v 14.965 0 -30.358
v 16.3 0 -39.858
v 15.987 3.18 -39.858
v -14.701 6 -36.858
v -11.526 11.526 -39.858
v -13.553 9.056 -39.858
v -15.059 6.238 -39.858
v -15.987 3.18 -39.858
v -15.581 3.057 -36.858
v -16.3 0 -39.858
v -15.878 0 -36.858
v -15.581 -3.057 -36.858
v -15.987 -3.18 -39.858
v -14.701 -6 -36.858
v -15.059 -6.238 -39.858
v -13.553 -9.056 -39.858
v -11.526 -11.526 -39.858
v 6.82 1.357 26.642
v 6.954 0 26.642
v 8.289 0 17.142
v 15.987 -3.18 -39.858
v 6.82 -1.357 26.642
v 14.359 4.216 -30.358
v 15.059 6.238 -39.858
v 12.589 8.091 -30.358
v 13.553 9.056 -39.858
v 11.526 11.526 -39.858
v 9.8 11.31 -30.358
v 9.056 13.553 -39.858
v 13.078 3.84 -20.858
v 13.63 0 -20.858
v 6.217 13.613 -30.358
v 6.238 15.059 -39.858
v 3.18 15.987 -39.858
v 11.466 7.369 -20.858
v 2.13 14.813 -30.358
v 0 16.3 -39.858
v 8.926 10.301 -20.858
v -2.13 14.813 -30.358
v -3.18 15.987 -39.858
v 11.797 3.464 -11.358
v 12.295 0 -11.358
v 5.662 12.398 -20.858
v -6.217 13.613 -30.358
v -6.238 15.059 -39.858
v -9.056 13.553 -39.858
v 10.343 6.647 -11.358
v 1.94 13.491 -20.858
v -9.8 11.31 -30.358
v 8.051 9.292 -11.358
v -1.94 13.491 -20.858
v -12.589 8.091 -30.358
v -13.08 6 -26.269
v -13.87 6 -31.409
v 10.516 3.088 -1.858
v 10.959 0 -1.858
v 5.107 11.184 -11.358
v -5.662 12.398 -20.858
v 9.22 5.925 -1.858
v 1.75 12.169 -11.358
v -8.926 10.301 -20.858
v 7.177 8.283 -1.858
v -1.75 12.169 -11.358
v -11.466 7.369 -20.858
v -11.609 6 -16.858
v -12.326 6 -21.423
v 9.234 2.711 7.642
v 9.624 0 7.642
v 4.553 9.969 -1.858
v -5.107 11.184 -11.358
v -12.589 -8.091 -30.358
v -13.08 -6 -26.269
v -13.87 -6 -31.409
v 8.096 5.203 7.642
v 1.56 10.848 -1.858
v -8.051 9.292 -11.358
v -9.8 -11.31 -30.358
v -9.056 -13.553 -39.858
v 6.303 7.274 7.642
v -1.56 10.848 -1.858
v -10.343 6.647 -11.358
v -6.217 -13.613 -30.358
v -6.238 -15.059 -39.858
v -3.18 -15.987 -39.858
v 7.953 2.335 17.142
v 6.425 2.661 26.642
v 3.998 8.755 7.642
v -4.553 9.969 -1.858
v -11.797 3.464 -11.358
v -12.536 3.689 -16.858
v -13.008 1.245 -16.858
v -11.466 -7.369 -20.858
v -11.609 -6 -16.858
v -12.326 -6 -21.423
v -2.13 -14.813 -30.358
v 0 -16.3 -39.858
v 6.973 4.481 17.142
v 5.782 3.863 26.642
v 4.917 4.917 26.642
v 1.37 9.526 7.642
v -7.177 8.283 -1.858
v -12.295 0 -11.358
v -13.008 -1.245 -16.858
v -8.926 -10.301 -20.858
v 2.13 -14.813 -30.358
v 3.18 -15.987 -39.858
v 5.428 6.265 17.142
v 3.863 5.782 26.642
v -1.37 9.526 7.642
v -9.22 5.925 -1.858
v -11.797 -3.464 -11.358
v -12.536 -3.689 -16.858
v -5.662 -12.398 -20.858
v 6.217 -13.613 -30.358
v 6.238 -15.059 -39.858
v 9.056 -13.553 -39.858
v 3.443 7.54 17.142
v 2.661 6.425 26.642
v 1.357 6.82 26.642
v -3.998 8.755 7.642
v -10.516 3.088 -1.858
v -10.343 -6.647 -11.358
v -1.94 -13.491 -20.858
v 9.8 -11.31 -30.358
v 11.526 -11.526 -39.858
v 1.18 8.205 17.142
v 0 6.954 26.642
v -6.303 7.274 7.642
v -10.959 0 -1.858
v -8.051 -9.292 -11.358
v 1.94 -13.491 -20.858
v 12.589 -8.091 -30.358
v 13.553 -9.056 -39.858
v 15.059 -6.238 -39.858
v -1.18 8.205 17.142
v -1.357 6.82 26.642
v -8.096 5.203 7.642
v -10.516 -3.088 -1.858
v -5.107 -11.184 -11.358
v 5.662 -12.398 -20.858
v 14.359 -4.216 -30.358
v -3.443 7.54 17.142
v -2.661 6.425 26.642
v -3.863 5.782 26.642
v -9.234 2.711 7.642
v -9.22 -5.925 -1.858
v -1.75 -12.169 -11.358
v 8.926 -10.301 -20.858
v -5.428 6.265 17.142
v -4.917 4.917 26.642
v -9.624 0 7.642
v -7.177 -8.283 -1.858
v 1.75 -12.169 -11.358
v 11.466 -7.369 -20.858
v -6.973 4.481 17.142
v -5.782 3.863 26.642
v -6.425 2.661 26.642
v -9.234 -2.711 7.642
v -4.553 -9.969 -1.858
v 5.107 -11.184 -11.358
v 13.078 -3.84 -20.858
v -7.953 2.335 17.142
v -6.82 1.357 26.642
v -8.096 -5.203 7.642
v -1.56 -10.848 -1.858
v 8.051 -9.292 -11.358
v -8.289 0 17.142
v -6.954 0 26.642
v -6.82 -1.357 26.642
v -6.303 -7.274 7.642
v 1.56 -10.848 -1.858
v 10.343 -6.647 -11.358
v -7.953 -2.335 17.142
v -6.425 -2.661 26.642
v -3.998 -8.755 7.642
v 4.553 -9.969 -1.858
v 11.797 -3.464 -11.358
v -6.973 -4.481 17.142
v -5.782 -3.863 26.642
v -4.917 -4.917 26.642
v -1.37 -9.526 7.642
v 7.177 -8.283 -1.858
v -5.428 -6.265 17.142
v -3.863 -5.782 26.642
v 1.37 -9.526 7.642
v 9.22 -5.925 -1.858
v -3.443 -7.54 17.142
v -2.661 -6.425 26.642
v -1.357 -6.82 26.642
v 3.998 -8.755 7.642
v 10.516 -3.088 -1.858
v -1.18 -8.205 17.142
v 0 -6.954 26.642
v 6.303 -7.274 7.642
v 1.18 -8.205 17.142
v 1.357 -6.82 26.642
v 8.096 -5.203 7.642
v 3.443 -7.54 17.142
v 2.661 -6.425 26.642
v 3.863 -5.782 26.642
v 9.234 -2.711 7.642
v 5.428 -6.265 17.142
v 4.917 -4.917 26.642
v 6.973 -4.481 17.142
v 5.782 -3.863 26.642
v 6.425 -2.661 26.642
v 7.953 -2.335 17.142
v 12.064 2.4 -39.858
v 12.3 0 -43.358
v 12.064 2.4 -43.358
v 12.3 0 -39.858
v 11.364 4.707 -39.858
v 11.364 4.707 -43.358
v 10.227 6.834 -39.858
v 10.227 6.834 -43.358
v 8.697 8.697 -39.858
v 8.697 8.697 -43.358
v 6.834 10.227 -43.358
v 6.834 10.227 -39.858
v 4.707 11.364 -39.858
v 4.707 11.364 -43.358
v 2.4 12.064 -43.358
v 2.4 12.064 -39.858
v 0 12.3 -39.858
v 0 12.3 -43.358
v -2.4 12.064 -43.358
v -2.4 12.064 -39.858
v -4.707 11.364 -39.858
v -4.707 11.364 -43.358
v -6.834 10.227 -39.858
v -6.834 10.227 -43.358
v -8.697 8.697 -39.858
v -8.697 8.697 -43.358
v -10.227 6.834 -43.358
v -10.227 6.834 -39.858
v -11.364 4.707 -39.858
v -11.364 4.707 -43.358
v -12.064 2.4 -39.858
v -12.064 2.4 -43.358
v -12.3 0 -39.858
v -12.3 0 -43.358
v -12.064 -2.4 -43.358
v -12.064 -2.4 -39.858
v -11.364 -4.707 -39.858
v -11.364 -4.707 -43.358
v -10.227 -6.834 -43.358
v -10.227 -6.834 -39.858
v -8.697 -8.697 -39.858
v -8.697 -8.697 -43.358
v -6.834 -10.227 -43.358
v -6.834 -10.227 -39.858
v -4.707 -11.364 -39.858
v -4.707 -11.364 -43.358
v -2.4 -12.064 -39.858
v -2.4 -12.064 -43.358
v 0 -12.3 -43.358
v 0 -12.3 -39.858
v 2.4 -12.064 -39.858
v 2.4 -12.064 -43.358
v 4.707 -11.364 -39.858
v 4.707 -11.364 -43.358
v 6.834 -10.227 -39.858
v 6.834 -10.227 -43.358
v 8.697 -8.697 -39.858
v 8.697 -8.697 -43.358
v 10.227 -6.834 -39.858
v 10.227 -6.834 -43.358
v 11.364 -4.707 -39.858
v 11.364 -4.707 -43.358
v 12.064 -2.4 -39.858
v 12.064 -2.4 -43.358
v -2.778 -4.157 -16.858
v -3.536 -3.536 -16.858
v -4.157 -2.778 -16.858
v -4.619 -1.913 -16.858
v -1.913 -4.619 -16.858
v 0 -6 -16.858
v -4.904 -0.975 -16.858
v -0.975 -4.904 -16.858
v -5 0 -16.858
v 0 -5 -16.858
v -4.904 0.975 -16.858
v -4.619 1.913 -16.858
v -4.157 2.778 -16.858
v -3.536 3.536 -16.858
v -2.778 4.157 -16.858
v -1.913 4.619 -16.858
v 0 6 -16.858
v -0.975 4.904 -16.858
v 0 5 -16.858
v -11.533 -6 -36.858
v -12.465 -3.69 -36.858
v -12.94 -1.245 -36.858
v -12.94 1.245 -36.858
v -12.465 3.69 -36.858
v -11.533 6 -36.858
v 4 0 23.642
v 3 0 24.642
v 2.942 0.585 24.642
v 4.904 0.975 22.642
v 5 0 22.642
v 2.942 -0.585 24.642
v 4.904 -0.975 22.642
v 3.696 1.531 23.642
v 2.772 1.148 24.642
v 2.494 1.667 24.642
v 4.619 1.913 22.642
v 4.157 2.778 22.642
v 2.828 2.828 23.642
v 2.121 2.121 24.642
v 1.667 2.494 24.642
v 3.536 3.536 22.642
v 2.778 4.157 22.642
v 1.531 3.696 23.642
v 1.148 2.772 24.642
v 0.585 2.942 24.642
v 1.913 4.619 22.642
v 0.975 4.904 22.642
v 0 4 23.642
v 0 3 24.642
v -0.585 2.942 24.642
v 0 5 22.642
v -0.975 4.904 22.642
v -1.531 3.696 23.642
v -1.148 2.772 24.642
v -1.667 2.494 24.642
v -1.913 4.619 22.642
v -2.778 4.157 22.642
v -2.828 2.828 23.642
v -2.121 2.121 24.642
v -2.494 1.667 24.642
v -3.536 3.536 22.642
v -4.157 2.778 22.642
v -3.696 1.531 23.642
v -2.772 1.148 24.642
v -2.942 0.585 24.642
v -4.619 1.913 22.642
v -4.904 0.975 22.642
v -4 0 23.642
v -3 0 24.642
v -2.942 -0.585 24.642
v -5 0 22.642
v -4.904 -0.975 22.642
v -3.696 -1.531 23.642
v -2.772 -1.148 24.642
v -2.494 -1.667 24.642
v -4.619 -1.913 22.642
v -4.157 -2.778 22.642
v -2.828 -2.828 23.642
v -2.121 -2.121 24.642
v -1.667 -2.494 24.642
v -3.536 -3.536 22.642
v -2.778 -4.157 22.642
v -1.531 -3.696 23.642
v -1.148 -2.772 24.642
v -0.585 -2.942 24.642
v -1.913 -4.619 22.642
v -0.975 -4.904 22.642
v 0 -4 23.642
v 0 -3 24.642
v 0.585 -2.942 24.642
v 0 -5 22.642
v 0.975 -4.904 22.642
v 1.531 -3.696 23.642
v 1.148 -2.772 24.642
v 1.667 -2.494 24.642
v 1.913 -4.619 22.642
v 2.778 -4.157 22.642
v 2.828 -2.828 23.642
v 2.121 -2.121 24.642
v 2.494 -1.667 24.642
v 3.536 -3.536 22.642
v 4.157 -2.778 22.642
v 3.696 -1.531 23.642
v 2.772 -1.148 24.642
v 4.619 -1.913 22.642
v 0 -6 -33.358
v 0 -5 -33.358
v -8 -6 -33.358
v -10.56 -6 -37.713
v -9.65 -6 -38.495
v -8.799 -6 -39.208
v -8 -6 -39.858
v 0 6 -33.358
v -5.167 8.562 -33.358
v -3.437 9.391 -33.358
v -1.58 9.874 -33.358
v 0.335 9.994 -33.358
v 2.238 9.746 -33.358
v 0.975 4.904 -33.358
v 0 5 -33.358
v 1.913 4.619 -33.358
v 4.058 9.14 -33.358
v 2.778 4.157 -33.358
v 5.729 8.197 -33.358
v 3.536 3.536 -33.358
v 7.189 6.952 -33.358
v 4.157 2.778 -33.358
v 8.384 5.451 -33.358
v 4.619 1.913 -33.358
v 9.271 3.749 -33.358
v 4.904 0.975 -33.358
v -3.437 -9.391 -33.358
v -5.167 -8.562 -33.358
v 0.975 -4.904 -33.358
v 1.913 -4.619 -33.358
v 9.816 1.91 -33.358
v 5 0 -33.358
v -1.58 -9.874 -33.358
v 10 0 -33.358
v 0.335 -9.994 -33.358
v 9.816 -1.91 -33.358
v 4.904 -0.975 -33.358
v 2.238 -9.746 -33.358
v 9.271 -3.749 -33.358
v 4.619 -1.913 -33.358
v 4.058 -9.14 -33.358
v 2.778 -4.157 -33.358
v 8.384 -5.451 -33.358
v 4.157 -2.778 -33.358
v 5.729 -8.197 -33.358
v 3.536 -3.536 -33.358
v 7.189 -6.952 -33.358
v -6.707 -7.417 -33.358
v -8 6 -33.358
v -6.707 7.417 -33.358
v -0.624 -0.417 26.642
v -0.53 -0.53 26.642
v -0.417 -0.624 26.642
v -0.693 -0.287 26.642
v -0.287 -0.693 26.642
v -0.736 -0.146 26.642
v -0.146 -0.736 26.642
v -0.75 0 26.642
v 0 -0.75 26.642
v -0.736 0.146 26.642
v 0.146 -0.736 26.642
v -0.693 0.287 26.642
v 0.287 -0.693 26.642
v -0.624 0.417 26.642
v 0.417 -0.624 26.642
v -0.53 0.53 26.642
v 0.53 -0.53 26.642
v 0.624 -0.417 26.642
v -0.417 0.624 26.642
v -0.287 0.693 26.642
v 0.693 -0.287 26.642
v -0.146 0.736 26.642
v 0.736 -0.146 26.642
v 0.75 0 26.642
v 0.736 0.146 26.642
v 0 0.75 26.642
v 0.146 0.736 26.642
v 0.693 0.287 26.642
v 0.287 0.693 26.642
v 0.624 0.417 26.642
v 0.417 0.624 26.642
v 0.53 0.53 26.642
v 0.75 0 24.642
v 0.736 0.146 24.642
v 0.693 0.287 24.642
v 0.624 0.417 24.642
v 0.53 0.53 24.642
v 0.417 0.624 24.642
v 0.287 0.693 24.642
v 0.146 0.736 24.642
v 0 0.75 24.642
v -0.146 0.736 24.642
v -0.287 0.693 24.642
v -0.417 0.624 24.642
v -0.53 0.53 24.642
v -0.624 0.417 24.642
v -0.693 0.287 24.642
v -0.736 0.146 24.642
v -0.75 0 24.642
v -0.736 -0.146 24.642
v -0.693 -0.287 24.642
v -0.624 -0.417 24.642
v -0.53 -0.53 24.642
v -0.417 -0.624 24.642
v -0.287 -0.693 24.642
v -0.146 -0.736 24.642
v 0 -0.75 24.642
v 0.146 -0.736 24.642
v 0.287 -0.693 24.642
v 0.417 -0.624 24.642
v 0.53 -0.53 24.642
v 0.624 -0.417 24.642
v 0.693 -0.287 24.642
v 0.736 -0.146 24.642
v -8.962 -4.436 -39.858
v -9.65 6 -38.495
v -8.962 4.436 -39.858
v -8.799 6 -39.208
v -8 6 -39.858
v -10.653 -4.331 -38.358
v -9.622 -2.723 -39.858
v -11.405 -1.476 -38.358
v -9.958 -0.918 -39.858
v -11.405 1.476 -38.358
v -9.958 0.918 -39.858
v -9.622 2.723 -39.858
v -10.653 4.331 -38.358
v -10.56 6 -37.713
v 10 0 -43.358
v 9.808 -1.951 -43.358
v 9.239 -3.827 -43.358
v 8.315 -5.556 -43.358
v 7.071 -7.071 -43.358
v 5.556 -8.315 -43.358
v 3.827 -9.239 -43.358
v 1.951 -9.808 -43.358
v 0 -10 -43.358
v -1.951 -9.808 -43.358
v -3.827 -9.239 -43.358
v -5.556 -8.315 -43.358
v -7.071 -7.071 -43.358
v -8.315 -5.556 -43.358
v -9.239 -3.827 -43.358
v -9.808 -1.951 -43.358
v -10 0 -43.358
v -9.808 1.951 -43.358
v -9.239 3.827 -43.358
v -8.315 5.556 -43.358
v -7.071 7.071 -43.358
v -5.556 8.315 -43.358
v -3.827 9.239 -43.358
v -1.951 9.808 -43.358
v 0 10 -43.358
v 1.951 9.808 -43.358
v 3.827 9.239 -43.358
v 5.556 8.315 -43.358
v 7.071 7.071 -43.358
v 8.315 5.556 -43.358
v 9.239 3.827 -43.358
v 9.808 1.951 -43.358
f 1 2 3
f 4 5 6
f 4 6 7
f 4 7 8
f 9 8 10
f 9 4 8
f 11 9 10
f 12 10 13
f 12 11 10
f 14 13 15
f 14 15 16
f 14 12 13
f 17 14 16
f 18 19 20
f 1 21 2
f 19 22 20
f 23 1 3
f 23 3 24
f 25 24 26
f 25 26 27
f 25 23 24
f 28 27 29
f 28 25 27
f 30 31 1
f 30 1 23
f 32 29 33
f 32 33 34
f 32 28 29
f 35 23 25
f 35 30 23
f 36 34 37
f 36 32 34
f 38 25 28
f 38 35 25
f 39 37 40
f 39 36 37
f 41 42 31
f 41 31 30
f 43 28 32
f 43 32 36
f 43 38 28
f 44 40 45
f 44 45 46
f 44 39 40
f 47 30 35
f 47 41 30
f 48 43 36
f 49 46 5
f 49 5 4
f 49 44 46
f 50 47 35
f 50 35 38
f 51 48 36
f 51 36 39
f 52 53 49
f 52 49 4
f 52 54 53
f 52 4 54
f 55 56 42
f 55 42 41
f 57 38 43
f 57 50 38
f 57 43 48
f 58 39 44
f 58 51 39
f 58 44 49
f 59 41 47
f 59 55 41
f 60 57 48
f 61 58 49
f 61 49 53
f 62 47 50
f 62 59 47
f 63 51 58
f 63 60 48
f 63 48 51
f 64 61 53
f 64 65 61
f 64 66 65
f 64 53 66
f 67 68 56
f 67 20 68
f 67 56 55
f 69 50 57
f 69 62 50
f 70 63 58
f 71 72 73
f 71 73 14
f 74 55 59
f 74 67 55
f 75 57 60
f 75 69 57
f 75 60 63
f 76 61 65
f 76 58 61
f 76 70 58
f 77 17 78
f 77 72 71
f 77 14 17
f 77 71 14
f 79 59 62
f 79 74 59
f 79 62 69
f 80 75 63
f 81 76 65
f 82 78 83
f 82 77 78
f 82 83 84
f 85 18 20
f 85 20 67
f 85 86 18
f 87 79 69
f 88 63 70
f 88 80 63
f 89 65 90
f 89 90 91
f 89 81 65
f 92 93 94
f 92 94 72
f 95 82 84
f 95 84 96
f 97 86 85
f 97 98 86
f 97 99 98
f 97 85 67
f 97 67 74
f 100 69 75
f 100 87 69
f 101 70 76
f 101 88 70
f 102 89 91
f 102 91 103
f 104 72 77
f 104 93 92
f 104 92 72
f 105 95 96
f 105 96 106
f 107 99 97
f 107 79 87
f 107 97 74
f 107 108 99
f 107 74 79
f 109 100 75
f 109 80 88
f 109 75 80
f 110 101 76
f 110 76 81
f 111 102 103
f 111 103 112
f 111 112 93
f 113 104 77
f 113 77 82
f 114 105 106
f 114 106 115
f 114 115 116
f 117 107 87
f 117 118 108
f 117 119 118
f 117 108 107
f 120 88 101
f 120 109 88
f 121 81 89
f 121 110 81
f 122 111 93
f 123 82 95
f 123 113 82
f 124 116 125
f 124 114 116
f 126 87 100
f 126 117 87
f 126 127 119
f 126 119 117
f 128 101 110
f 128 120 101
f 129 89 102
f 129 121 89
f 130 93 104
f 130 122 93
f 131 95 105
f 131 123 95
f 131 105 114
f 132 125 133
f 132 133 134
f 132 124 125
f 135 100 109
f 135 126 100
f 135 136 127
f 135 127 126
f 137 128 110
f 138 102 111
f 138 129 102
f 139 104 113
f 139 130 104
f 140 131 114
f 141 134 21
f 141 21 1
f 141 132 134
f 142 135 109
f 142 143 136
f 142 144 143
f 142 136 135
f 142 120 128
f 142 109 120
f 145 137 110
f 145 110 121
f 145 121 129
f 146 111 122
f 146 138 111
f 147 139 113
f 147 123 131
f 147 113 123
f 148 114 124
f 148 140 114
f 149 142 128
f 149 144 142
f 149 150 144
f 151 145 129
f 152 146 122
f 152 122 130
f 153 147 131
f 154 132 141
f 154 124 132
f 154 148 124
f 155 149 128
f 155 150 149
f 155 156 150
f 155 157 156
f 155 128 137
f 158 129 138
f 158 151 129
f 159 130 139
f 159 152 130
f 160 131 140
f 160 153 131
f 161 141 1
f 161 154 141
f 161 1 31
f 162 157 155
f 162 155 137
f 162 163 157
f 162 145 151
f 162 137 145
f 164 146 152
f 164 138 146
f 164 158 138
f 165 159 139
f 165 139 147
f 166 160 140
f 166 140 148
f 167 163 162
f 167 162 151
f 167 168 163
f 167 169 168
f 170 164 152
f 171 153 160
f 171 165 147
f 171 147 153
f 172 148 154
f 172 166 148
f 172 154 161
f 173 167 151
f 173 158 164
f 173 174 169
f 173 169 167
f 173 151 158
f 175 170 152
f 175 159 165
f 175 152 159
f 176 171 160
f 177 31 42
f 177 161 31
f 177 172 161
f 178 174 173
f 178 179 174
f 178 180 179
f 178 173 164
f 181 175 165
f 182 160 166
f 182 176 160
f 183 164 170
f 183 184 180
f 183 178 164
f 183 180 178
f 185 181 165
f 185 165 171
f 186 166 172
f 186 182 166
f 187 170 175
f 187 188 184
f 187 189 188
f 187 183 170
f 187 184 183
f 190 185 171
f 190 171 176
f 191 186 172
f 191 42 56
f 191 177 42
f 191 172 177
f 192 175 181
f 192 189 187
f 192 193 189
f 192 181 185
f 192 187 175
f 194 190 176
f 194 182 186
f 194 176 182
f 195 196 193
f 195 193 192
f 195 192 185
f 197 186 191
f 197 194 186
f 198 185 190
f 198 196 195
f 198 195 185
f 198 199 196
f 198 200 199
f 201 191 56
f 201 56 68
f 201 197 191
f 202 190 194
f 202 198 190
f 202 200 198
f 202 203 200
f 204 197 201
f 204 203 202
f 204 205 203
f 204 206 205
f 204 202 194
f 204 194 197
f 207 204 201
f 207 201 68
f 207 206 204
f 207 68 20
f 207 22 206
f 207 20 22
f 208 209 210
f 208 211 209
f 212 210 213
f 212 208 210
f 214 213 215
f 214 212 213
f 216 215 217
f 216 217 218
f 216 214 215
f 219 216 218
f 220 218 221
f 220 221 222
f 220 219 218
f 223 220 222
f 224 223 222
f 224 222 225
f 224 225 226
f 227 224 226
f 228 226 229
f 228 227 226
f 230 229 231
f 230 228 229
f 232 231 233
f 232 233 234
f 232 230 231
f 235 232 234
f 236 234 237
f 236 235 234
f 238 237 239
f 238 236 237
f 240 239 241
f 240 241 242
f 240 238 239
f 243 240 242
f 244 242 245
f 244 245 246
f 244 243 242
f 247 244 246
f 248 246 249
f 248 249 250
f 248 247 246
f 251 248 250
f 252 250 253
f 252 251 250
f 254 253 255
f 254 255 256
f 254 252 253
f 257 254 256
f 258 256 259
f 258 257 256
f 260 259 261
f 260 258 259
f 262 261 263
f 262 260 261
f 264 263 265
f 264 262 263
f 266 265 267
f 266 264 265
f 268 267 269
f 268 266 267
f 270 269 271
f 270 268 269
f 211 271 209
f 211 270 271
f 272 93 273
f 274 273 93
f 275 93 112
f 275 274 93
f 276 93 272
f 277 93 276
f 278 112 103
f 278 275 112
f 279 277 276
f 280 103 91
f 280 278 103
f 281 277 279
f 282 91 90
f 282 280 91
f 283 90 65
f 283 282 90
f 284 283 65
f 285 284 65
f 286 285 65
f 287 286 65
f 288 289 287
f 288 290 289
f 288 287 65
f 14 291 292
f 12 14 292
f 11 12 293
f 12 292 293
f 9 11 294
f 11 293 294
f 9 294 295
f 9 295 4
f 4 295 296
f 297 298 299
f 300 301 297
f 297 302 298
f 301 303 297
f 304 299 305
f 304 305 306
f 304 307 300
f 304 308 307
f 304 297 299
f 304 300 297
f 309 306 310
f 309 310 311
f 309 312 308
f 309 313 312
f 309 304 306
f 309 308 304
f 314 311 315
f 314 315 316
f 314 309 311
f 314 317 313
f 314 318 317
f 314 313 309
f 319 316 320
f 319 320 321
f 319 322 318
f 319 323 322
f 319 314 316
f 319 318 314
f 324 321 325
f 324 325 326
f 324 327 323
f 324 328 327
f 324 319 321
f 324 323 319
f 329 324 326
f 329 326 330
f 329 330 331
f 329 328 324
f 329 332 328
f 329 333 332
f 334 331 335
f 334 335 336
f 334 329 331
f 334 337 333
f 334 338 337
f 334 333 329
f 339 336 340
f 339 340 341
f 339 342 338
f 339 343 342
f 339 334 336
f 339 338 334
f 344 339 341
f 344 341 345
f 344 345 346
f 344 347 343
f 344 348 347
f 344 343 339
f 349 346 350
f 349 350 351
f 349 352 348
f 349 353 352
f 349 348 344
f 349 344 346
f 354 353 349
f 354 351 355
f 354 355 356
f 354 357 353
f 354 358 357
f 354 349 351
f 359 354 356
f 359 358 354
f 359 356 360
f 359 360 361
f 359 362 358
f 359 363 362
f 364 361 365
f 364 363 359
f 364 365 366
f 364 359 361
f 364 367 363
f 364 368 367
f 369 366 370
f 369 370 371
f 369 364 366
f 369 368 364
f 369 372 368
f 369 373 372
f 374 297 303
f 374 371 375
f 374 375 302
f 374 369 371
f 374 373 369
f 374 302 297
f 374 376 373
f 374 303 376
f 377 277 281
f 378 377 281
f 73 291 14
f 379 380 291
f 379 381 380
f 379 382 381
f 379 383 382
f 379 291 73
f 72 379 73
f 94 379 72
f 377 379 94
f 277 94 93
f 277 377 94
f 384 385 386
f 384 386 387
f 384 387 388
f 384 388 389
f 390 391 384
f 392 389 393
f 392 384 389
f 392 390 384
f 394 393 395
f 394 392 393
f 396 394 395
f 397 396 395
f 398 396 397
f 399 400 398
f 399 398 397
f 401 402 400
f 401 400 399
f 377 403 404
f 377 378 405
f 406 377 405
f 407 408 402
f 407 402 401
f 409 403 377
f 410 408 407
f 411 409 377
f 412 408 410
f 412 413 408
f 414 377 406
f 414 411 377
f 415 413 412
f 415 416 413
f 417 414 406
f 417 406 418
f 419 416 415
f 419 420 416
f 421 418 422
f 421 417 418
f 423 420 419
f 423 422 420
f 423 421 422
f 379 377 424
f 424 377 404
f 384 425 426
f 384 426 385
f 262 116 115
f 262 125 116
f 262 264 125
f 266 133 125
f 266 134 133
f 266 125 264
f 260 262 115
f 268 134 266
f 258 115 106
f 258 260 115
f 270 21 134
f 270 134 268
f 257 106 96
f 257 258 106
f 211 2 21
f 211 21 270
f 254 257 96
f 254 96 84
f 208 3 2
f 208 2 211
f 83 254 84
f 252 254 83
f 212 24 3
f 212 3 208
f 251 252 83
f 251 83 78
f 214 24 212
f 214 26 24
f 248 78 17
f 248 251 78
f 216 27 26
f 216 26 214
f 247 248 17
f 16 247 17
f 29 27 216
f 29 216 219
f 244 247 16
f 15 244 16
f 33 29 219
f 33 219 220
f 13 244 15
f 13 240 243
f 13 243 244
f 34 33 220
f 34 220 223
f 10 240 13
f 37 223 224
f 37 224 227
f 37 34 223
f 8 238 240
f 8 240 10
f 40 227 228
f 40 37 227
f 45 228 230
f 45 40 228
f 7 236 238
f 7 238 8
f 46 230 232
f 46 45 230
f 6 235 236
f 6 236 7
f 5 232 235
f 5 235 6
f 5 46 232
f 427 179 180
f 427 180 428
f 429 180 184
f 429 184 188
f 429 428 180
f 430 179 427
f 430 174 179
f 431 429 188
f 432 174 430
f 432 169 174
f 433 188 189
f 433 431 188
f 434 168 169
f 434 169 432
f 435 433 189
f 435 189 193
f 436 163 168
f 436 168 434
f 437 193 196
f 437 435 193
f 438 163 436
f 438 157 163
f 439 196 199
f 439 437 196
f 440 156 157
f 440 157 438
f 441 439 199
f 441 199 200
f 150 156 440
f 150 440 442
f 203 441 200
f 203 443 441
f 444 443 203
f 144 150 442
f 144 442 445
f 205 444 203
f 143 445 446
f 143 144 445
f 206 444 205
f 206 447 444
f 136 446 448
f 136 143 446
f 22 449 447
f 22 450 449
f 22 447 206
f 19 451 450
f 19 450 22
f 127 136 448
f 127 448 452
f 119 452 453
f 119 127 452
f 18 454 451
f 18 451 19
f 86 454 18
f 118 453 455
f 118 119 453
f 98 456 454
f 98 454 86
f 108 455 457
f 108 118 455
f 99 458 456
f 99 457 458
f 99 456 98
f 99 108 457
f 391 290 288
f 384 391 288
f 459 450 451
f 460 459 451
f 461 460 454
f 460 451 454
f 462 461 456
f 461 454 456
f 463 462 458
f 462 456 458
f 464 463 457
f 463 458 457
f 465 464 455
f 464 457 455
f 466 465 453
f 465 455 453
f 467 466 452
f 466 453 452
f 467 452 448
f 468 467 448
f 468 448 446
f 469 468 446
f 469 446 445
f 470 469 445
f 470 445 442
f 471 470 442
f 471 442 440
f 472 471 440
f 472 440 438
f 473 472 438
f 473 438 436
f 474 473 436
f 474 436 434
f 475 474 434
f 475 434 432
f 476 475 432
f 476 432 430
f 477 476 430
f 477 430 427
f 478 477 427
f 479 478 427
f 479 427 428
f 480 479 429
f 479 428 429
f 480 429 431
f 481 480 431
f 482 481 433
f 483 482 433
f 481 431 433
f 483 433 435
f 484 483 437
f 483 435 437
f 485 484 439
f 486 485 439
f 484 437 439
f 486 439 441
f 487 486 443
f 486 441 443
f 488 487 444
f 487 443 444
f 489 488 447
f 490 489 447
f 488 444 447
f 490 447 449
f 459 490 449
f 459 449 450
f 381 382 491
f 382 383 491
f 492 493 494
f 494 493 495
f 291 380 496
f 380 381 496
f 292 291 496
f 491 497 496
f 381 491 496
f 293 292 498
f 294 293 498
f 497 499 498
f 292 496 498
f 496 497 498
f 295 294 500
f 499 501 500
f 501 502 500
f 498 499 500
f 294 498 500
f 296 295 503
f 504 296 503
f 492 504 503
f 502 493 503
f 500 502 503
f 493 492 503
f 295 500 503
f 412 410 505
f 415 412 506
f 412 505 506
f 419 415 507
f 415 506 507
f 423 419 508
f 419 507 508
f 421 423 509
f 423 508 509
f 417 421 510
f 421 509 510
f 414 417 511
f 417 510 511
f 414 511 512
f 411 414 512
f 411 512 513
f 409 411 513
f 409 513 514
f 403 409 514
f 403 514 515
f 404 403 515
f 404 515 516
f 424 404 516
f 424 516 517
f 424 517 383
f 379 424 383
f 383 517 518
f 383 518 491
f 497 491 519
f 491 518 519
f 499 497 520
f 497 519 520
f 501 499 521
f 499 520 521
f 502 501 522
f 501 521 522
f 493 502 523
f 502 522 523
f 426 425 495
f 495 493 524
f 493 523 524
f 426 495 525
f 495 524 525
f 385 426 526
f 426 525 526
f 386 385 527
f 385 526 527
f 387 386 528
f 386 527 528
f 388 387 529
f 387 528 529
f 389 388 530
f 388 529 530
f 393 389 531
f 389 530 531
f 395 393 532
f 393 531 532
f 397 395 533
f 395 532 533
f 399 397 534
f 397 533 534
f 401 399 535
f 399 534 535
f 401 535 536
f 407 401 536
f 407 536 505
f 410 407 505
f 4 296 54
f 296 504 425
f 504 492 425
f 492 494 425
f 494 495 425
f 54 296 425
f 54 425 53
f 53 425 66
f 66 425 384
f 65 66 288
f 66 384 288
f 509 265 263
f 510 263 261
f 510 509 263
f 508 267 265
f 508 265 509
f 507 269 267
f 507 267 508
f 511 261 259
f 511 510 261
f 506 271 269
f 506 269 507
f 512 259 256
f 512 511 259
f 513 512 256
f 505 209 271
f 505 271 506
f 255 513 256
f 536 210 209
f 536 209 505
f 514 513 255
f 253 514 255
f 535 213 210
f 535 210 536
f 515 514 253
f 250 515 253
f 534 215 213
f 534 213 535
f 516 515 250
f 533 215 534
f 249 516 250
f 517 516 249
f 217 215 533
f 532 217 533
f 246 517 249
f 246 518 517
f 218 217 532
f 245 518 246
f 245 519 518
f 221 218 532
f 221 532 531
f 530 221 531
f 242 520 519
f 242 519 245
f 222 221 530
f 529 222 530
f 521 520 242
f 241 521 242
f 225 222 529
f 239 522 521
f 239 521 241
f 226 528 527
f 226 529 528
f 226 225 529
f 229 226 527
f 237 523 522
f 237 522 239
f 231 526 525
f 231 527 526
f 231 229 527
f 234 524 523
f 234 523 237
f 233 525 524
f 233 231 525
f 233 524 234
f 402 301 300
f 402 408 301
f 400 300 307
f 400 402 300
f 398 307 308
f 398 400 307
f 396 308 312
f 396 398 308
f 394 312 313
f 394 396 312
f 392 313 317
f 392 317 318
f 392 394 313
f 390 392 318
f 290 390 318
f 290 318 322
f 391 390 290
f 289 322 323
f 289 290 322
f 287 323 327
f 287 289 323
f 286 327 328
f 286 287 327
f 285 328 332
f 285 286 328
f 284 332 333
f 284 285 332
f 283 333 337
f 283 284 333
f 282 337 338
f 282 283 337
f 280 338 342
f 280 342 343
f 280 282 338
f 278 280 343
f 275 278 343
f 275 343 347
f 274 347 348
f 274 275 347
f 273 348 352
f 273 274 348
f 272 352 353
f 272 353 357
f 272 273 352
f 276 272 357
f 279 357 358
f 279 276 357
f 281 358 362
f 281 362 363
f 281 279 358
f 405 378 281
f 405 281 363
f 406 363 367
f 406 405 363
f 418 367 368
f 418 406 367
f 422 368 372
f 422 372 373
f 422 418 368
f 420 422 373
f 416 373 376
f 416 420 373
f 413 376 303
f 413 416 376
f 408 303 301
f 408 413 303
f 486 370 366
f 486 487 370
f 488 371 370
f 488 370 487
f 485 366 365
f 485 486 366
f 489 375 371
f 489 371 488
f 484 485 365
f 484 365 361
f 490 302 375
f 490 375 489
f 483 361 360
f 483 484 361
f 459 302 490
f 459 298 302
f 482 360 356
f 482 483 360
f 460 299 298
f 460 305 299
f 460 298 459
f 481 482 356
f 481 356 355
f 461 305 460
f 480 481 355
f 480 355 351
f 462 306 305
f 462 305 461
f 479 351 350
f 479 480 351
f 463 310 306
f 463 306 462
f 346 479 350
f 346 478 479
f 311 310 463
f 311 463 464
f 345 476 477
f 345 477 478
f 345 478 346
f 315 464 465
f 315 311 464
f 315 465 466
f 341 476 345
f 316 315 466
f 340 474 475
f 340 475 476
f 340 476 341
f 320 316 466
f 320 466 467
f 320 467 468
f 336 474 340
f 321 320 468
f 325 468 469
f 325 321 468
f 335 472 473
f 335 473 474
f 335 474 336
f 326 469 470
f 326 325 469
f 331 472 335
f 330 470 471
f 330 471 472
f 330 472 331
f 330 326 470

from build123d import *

# Parameters (mm, degrees)
F2_R     = 0.75
F3_DEPTH = 70.001
F4_W     = 12
F4_H     = 20
F5_DEPTH = 25
F6_R     = 10
F7_DEPTH = 10
F8_SIZE  = 3


with BuildPart() as f1:
    # F0 (on Front) → F1 (revolve)
    with BuildSketch(Plane.XZ):
        Polygon((6.954034, 26.641815), (0, 26.641815), (0, 24.641815), (3, 24.641815), (5, 22.641815), (5, -43.358185), (12.3, -43.358185), (12.3, -39.858185), (16.3, -39.858185), align=None)
    revolve(axis=Axis((0, 0, 25.641815), (0, 0, 1)))

    # F2 (on face) → F3 (cut, through all)
    with BuildSketch(Plane.XY.offset(26.641815)):
        Circle(F2_R)
    extrude(amount=-F3_DEPTH, mode=Mode.SUBTRACT)

    # F4 (on Right) → F5 (cut)
    with BuildSketch(Plane.YZ):
        with Locations((0, -26.858185)):
            Rectangle(F4_W, F4_H)
    extrude(amount=-F5_DEPTH, mode=Mode.SUBTRACT)

    # F6 (on face) → F7 (cut)
    with BuildSketch(Plane(origin=(0, 0, -43.358185), x_dir=(1, 0, 0), z_dir=(0, 0, -1))):
        Circle(F6_R)
    extrude(amount=-F7_DEPTH, mode=Mode.SUBTRACT)

    # F8
    f8_edges = [f1.edges().sort_by_distance(p)[0] for p in [
        (-10, 0, -36.858185),
    ]]
    chamfer(f8_edges, length=F8_SIZE)


solid = f1.part
